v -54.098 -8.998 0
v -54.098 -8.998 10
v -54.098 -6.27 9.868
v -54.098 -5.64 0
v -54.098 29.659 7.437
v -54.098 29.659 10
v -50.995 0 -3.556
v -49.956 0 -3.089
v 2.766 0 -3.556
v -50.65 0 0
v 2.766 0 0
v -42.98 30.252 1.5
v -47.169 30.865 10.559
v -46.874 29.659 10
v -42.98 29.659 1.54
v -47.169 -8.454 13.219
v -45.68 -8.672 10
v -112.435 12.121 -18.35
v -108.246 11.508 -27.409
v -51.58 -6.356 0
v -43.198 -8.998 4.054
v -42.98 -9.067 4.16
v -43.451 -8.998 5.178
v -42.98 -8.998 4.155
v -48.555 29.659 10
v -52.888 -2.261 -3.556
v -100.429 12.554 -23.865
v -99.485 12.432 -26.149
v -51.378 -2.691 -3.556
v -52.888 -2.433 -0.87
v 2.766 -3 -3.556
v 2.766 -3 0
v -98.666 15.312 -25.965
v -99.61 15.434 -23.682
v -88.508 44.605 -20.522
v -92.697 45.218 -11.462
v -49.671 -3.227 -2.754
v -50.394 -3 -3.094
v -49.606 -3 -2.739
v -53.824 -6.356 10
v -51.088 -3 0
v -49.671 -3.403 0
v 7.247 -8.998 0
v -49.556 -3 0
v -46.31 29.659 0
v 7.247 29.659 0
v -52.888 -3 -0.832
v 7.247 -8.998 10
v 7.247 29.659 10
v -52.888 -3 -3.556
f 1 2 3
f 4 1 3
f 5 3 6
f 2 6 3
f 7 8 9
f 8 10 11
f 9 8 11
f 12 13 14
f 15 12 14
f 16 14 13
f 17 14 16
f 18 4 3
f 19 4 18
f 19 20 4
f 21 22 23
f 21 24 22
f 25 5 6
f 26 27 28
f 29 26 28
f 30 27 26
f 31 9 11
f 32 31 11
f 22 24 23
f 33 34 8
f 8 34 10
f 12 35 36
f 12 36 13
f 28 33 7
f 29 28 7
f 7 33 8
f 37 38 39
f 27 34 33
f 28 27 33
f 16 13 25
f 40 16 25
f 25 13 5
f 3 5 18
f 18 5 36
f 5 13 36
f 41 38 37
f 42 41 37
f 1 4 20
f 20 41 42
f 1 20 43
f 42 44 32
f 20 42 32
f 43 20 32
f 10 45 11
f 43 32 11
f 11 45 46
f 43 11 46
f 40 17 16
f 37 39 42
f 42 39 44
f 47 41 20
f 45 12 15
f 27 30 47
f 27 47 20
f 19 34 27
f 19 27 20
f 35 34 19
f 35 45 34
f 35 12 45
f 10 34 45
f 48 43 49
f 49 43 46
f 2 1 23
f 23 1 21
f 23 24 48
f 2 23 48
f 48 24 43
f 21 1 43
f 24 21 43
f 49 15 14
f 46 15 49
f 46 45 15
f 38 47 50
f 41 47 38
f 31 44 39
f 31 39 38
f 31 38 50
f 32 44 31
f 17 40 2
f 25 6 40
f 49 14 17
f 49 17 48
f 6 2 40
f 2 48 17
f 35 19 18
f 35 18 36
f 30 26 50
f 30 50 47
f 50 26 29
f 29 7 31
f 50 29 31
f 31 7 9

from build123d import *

# Parameters (mm, degrees)
SKETCH1_W           = 61.345012487
SKETCH1_H           = 38.657423861
BOSS_EXTRUDE1_DEPTH = 10
BOSS_EXTRUDE2_DEPTH = 10
SKETCH3_W           = 55.653219253
SKETCH3_H           = 4.667772156
BOSS_EXTRUDE3_DEPTH = 3
BOSS_EXTRUDE4_DEPTH = 3


with BuildPart() as part:
    # Sketch1 → Boss-Extrude1 (new body)
    with BuildSketch(Plane.XY):
        with Locations((-23.425520154, 10.330558338)):
            Rectangle(SKETCH1_W, SKETCH1_H)
    extrude(amount=BOSS_EXTRUDE1_DEPTH)

    # Sketch2 → Boss-Extrude2 (add)
    with BuildSketch(Plane(origin=(-8.887322321, 1.300253896, 19.221447103), x_dir=(0.908038086, 0.028271458, 0.417932481), z_dir=(-0.418887615, 0.061285079, 0.905967607))):
        Polygon((-87.68448092, 45.888055238), (-37.545380932, 30.082102221), (-37.545380932, -9.327101998), (-109.421725422, 13.33134469), align=None)
    extrude(amount=BOSS_EXTRUDE2_DEPTH)

    # Sketch3 → Boss-Extrude3 (add)
    with BuildSketch(Plane.XZ):
        with Locations((-25.061108276, -1.221803115)):
            Rectangle(SKETCH3_W, SKETCH3_H)
    extrude(amount=BOSS_EXTRUDE3_DEPTH)

    # Sketch5 → Boss-Extrude4 (add)
    with BuildSketch(Plane(origin=(-3.775073918, -13.275413408, -0.84743311), x_dir=(0.962011868, -0.272453087, -0.017391983), z_dir=(-0.27300763, -0.960057797, -0.061285079))):
        Polygon((-47.103632436, 2.289571082), (-100.846305257, -21.775814591), (-98.638237359, -26.887445035), (-46.85648275, -2.542586037), (-46.85648275, 2.289571082), align=None)
    extrude(amount=BOSS_EXTRUDE4_DEPTH)


solid = part.part
